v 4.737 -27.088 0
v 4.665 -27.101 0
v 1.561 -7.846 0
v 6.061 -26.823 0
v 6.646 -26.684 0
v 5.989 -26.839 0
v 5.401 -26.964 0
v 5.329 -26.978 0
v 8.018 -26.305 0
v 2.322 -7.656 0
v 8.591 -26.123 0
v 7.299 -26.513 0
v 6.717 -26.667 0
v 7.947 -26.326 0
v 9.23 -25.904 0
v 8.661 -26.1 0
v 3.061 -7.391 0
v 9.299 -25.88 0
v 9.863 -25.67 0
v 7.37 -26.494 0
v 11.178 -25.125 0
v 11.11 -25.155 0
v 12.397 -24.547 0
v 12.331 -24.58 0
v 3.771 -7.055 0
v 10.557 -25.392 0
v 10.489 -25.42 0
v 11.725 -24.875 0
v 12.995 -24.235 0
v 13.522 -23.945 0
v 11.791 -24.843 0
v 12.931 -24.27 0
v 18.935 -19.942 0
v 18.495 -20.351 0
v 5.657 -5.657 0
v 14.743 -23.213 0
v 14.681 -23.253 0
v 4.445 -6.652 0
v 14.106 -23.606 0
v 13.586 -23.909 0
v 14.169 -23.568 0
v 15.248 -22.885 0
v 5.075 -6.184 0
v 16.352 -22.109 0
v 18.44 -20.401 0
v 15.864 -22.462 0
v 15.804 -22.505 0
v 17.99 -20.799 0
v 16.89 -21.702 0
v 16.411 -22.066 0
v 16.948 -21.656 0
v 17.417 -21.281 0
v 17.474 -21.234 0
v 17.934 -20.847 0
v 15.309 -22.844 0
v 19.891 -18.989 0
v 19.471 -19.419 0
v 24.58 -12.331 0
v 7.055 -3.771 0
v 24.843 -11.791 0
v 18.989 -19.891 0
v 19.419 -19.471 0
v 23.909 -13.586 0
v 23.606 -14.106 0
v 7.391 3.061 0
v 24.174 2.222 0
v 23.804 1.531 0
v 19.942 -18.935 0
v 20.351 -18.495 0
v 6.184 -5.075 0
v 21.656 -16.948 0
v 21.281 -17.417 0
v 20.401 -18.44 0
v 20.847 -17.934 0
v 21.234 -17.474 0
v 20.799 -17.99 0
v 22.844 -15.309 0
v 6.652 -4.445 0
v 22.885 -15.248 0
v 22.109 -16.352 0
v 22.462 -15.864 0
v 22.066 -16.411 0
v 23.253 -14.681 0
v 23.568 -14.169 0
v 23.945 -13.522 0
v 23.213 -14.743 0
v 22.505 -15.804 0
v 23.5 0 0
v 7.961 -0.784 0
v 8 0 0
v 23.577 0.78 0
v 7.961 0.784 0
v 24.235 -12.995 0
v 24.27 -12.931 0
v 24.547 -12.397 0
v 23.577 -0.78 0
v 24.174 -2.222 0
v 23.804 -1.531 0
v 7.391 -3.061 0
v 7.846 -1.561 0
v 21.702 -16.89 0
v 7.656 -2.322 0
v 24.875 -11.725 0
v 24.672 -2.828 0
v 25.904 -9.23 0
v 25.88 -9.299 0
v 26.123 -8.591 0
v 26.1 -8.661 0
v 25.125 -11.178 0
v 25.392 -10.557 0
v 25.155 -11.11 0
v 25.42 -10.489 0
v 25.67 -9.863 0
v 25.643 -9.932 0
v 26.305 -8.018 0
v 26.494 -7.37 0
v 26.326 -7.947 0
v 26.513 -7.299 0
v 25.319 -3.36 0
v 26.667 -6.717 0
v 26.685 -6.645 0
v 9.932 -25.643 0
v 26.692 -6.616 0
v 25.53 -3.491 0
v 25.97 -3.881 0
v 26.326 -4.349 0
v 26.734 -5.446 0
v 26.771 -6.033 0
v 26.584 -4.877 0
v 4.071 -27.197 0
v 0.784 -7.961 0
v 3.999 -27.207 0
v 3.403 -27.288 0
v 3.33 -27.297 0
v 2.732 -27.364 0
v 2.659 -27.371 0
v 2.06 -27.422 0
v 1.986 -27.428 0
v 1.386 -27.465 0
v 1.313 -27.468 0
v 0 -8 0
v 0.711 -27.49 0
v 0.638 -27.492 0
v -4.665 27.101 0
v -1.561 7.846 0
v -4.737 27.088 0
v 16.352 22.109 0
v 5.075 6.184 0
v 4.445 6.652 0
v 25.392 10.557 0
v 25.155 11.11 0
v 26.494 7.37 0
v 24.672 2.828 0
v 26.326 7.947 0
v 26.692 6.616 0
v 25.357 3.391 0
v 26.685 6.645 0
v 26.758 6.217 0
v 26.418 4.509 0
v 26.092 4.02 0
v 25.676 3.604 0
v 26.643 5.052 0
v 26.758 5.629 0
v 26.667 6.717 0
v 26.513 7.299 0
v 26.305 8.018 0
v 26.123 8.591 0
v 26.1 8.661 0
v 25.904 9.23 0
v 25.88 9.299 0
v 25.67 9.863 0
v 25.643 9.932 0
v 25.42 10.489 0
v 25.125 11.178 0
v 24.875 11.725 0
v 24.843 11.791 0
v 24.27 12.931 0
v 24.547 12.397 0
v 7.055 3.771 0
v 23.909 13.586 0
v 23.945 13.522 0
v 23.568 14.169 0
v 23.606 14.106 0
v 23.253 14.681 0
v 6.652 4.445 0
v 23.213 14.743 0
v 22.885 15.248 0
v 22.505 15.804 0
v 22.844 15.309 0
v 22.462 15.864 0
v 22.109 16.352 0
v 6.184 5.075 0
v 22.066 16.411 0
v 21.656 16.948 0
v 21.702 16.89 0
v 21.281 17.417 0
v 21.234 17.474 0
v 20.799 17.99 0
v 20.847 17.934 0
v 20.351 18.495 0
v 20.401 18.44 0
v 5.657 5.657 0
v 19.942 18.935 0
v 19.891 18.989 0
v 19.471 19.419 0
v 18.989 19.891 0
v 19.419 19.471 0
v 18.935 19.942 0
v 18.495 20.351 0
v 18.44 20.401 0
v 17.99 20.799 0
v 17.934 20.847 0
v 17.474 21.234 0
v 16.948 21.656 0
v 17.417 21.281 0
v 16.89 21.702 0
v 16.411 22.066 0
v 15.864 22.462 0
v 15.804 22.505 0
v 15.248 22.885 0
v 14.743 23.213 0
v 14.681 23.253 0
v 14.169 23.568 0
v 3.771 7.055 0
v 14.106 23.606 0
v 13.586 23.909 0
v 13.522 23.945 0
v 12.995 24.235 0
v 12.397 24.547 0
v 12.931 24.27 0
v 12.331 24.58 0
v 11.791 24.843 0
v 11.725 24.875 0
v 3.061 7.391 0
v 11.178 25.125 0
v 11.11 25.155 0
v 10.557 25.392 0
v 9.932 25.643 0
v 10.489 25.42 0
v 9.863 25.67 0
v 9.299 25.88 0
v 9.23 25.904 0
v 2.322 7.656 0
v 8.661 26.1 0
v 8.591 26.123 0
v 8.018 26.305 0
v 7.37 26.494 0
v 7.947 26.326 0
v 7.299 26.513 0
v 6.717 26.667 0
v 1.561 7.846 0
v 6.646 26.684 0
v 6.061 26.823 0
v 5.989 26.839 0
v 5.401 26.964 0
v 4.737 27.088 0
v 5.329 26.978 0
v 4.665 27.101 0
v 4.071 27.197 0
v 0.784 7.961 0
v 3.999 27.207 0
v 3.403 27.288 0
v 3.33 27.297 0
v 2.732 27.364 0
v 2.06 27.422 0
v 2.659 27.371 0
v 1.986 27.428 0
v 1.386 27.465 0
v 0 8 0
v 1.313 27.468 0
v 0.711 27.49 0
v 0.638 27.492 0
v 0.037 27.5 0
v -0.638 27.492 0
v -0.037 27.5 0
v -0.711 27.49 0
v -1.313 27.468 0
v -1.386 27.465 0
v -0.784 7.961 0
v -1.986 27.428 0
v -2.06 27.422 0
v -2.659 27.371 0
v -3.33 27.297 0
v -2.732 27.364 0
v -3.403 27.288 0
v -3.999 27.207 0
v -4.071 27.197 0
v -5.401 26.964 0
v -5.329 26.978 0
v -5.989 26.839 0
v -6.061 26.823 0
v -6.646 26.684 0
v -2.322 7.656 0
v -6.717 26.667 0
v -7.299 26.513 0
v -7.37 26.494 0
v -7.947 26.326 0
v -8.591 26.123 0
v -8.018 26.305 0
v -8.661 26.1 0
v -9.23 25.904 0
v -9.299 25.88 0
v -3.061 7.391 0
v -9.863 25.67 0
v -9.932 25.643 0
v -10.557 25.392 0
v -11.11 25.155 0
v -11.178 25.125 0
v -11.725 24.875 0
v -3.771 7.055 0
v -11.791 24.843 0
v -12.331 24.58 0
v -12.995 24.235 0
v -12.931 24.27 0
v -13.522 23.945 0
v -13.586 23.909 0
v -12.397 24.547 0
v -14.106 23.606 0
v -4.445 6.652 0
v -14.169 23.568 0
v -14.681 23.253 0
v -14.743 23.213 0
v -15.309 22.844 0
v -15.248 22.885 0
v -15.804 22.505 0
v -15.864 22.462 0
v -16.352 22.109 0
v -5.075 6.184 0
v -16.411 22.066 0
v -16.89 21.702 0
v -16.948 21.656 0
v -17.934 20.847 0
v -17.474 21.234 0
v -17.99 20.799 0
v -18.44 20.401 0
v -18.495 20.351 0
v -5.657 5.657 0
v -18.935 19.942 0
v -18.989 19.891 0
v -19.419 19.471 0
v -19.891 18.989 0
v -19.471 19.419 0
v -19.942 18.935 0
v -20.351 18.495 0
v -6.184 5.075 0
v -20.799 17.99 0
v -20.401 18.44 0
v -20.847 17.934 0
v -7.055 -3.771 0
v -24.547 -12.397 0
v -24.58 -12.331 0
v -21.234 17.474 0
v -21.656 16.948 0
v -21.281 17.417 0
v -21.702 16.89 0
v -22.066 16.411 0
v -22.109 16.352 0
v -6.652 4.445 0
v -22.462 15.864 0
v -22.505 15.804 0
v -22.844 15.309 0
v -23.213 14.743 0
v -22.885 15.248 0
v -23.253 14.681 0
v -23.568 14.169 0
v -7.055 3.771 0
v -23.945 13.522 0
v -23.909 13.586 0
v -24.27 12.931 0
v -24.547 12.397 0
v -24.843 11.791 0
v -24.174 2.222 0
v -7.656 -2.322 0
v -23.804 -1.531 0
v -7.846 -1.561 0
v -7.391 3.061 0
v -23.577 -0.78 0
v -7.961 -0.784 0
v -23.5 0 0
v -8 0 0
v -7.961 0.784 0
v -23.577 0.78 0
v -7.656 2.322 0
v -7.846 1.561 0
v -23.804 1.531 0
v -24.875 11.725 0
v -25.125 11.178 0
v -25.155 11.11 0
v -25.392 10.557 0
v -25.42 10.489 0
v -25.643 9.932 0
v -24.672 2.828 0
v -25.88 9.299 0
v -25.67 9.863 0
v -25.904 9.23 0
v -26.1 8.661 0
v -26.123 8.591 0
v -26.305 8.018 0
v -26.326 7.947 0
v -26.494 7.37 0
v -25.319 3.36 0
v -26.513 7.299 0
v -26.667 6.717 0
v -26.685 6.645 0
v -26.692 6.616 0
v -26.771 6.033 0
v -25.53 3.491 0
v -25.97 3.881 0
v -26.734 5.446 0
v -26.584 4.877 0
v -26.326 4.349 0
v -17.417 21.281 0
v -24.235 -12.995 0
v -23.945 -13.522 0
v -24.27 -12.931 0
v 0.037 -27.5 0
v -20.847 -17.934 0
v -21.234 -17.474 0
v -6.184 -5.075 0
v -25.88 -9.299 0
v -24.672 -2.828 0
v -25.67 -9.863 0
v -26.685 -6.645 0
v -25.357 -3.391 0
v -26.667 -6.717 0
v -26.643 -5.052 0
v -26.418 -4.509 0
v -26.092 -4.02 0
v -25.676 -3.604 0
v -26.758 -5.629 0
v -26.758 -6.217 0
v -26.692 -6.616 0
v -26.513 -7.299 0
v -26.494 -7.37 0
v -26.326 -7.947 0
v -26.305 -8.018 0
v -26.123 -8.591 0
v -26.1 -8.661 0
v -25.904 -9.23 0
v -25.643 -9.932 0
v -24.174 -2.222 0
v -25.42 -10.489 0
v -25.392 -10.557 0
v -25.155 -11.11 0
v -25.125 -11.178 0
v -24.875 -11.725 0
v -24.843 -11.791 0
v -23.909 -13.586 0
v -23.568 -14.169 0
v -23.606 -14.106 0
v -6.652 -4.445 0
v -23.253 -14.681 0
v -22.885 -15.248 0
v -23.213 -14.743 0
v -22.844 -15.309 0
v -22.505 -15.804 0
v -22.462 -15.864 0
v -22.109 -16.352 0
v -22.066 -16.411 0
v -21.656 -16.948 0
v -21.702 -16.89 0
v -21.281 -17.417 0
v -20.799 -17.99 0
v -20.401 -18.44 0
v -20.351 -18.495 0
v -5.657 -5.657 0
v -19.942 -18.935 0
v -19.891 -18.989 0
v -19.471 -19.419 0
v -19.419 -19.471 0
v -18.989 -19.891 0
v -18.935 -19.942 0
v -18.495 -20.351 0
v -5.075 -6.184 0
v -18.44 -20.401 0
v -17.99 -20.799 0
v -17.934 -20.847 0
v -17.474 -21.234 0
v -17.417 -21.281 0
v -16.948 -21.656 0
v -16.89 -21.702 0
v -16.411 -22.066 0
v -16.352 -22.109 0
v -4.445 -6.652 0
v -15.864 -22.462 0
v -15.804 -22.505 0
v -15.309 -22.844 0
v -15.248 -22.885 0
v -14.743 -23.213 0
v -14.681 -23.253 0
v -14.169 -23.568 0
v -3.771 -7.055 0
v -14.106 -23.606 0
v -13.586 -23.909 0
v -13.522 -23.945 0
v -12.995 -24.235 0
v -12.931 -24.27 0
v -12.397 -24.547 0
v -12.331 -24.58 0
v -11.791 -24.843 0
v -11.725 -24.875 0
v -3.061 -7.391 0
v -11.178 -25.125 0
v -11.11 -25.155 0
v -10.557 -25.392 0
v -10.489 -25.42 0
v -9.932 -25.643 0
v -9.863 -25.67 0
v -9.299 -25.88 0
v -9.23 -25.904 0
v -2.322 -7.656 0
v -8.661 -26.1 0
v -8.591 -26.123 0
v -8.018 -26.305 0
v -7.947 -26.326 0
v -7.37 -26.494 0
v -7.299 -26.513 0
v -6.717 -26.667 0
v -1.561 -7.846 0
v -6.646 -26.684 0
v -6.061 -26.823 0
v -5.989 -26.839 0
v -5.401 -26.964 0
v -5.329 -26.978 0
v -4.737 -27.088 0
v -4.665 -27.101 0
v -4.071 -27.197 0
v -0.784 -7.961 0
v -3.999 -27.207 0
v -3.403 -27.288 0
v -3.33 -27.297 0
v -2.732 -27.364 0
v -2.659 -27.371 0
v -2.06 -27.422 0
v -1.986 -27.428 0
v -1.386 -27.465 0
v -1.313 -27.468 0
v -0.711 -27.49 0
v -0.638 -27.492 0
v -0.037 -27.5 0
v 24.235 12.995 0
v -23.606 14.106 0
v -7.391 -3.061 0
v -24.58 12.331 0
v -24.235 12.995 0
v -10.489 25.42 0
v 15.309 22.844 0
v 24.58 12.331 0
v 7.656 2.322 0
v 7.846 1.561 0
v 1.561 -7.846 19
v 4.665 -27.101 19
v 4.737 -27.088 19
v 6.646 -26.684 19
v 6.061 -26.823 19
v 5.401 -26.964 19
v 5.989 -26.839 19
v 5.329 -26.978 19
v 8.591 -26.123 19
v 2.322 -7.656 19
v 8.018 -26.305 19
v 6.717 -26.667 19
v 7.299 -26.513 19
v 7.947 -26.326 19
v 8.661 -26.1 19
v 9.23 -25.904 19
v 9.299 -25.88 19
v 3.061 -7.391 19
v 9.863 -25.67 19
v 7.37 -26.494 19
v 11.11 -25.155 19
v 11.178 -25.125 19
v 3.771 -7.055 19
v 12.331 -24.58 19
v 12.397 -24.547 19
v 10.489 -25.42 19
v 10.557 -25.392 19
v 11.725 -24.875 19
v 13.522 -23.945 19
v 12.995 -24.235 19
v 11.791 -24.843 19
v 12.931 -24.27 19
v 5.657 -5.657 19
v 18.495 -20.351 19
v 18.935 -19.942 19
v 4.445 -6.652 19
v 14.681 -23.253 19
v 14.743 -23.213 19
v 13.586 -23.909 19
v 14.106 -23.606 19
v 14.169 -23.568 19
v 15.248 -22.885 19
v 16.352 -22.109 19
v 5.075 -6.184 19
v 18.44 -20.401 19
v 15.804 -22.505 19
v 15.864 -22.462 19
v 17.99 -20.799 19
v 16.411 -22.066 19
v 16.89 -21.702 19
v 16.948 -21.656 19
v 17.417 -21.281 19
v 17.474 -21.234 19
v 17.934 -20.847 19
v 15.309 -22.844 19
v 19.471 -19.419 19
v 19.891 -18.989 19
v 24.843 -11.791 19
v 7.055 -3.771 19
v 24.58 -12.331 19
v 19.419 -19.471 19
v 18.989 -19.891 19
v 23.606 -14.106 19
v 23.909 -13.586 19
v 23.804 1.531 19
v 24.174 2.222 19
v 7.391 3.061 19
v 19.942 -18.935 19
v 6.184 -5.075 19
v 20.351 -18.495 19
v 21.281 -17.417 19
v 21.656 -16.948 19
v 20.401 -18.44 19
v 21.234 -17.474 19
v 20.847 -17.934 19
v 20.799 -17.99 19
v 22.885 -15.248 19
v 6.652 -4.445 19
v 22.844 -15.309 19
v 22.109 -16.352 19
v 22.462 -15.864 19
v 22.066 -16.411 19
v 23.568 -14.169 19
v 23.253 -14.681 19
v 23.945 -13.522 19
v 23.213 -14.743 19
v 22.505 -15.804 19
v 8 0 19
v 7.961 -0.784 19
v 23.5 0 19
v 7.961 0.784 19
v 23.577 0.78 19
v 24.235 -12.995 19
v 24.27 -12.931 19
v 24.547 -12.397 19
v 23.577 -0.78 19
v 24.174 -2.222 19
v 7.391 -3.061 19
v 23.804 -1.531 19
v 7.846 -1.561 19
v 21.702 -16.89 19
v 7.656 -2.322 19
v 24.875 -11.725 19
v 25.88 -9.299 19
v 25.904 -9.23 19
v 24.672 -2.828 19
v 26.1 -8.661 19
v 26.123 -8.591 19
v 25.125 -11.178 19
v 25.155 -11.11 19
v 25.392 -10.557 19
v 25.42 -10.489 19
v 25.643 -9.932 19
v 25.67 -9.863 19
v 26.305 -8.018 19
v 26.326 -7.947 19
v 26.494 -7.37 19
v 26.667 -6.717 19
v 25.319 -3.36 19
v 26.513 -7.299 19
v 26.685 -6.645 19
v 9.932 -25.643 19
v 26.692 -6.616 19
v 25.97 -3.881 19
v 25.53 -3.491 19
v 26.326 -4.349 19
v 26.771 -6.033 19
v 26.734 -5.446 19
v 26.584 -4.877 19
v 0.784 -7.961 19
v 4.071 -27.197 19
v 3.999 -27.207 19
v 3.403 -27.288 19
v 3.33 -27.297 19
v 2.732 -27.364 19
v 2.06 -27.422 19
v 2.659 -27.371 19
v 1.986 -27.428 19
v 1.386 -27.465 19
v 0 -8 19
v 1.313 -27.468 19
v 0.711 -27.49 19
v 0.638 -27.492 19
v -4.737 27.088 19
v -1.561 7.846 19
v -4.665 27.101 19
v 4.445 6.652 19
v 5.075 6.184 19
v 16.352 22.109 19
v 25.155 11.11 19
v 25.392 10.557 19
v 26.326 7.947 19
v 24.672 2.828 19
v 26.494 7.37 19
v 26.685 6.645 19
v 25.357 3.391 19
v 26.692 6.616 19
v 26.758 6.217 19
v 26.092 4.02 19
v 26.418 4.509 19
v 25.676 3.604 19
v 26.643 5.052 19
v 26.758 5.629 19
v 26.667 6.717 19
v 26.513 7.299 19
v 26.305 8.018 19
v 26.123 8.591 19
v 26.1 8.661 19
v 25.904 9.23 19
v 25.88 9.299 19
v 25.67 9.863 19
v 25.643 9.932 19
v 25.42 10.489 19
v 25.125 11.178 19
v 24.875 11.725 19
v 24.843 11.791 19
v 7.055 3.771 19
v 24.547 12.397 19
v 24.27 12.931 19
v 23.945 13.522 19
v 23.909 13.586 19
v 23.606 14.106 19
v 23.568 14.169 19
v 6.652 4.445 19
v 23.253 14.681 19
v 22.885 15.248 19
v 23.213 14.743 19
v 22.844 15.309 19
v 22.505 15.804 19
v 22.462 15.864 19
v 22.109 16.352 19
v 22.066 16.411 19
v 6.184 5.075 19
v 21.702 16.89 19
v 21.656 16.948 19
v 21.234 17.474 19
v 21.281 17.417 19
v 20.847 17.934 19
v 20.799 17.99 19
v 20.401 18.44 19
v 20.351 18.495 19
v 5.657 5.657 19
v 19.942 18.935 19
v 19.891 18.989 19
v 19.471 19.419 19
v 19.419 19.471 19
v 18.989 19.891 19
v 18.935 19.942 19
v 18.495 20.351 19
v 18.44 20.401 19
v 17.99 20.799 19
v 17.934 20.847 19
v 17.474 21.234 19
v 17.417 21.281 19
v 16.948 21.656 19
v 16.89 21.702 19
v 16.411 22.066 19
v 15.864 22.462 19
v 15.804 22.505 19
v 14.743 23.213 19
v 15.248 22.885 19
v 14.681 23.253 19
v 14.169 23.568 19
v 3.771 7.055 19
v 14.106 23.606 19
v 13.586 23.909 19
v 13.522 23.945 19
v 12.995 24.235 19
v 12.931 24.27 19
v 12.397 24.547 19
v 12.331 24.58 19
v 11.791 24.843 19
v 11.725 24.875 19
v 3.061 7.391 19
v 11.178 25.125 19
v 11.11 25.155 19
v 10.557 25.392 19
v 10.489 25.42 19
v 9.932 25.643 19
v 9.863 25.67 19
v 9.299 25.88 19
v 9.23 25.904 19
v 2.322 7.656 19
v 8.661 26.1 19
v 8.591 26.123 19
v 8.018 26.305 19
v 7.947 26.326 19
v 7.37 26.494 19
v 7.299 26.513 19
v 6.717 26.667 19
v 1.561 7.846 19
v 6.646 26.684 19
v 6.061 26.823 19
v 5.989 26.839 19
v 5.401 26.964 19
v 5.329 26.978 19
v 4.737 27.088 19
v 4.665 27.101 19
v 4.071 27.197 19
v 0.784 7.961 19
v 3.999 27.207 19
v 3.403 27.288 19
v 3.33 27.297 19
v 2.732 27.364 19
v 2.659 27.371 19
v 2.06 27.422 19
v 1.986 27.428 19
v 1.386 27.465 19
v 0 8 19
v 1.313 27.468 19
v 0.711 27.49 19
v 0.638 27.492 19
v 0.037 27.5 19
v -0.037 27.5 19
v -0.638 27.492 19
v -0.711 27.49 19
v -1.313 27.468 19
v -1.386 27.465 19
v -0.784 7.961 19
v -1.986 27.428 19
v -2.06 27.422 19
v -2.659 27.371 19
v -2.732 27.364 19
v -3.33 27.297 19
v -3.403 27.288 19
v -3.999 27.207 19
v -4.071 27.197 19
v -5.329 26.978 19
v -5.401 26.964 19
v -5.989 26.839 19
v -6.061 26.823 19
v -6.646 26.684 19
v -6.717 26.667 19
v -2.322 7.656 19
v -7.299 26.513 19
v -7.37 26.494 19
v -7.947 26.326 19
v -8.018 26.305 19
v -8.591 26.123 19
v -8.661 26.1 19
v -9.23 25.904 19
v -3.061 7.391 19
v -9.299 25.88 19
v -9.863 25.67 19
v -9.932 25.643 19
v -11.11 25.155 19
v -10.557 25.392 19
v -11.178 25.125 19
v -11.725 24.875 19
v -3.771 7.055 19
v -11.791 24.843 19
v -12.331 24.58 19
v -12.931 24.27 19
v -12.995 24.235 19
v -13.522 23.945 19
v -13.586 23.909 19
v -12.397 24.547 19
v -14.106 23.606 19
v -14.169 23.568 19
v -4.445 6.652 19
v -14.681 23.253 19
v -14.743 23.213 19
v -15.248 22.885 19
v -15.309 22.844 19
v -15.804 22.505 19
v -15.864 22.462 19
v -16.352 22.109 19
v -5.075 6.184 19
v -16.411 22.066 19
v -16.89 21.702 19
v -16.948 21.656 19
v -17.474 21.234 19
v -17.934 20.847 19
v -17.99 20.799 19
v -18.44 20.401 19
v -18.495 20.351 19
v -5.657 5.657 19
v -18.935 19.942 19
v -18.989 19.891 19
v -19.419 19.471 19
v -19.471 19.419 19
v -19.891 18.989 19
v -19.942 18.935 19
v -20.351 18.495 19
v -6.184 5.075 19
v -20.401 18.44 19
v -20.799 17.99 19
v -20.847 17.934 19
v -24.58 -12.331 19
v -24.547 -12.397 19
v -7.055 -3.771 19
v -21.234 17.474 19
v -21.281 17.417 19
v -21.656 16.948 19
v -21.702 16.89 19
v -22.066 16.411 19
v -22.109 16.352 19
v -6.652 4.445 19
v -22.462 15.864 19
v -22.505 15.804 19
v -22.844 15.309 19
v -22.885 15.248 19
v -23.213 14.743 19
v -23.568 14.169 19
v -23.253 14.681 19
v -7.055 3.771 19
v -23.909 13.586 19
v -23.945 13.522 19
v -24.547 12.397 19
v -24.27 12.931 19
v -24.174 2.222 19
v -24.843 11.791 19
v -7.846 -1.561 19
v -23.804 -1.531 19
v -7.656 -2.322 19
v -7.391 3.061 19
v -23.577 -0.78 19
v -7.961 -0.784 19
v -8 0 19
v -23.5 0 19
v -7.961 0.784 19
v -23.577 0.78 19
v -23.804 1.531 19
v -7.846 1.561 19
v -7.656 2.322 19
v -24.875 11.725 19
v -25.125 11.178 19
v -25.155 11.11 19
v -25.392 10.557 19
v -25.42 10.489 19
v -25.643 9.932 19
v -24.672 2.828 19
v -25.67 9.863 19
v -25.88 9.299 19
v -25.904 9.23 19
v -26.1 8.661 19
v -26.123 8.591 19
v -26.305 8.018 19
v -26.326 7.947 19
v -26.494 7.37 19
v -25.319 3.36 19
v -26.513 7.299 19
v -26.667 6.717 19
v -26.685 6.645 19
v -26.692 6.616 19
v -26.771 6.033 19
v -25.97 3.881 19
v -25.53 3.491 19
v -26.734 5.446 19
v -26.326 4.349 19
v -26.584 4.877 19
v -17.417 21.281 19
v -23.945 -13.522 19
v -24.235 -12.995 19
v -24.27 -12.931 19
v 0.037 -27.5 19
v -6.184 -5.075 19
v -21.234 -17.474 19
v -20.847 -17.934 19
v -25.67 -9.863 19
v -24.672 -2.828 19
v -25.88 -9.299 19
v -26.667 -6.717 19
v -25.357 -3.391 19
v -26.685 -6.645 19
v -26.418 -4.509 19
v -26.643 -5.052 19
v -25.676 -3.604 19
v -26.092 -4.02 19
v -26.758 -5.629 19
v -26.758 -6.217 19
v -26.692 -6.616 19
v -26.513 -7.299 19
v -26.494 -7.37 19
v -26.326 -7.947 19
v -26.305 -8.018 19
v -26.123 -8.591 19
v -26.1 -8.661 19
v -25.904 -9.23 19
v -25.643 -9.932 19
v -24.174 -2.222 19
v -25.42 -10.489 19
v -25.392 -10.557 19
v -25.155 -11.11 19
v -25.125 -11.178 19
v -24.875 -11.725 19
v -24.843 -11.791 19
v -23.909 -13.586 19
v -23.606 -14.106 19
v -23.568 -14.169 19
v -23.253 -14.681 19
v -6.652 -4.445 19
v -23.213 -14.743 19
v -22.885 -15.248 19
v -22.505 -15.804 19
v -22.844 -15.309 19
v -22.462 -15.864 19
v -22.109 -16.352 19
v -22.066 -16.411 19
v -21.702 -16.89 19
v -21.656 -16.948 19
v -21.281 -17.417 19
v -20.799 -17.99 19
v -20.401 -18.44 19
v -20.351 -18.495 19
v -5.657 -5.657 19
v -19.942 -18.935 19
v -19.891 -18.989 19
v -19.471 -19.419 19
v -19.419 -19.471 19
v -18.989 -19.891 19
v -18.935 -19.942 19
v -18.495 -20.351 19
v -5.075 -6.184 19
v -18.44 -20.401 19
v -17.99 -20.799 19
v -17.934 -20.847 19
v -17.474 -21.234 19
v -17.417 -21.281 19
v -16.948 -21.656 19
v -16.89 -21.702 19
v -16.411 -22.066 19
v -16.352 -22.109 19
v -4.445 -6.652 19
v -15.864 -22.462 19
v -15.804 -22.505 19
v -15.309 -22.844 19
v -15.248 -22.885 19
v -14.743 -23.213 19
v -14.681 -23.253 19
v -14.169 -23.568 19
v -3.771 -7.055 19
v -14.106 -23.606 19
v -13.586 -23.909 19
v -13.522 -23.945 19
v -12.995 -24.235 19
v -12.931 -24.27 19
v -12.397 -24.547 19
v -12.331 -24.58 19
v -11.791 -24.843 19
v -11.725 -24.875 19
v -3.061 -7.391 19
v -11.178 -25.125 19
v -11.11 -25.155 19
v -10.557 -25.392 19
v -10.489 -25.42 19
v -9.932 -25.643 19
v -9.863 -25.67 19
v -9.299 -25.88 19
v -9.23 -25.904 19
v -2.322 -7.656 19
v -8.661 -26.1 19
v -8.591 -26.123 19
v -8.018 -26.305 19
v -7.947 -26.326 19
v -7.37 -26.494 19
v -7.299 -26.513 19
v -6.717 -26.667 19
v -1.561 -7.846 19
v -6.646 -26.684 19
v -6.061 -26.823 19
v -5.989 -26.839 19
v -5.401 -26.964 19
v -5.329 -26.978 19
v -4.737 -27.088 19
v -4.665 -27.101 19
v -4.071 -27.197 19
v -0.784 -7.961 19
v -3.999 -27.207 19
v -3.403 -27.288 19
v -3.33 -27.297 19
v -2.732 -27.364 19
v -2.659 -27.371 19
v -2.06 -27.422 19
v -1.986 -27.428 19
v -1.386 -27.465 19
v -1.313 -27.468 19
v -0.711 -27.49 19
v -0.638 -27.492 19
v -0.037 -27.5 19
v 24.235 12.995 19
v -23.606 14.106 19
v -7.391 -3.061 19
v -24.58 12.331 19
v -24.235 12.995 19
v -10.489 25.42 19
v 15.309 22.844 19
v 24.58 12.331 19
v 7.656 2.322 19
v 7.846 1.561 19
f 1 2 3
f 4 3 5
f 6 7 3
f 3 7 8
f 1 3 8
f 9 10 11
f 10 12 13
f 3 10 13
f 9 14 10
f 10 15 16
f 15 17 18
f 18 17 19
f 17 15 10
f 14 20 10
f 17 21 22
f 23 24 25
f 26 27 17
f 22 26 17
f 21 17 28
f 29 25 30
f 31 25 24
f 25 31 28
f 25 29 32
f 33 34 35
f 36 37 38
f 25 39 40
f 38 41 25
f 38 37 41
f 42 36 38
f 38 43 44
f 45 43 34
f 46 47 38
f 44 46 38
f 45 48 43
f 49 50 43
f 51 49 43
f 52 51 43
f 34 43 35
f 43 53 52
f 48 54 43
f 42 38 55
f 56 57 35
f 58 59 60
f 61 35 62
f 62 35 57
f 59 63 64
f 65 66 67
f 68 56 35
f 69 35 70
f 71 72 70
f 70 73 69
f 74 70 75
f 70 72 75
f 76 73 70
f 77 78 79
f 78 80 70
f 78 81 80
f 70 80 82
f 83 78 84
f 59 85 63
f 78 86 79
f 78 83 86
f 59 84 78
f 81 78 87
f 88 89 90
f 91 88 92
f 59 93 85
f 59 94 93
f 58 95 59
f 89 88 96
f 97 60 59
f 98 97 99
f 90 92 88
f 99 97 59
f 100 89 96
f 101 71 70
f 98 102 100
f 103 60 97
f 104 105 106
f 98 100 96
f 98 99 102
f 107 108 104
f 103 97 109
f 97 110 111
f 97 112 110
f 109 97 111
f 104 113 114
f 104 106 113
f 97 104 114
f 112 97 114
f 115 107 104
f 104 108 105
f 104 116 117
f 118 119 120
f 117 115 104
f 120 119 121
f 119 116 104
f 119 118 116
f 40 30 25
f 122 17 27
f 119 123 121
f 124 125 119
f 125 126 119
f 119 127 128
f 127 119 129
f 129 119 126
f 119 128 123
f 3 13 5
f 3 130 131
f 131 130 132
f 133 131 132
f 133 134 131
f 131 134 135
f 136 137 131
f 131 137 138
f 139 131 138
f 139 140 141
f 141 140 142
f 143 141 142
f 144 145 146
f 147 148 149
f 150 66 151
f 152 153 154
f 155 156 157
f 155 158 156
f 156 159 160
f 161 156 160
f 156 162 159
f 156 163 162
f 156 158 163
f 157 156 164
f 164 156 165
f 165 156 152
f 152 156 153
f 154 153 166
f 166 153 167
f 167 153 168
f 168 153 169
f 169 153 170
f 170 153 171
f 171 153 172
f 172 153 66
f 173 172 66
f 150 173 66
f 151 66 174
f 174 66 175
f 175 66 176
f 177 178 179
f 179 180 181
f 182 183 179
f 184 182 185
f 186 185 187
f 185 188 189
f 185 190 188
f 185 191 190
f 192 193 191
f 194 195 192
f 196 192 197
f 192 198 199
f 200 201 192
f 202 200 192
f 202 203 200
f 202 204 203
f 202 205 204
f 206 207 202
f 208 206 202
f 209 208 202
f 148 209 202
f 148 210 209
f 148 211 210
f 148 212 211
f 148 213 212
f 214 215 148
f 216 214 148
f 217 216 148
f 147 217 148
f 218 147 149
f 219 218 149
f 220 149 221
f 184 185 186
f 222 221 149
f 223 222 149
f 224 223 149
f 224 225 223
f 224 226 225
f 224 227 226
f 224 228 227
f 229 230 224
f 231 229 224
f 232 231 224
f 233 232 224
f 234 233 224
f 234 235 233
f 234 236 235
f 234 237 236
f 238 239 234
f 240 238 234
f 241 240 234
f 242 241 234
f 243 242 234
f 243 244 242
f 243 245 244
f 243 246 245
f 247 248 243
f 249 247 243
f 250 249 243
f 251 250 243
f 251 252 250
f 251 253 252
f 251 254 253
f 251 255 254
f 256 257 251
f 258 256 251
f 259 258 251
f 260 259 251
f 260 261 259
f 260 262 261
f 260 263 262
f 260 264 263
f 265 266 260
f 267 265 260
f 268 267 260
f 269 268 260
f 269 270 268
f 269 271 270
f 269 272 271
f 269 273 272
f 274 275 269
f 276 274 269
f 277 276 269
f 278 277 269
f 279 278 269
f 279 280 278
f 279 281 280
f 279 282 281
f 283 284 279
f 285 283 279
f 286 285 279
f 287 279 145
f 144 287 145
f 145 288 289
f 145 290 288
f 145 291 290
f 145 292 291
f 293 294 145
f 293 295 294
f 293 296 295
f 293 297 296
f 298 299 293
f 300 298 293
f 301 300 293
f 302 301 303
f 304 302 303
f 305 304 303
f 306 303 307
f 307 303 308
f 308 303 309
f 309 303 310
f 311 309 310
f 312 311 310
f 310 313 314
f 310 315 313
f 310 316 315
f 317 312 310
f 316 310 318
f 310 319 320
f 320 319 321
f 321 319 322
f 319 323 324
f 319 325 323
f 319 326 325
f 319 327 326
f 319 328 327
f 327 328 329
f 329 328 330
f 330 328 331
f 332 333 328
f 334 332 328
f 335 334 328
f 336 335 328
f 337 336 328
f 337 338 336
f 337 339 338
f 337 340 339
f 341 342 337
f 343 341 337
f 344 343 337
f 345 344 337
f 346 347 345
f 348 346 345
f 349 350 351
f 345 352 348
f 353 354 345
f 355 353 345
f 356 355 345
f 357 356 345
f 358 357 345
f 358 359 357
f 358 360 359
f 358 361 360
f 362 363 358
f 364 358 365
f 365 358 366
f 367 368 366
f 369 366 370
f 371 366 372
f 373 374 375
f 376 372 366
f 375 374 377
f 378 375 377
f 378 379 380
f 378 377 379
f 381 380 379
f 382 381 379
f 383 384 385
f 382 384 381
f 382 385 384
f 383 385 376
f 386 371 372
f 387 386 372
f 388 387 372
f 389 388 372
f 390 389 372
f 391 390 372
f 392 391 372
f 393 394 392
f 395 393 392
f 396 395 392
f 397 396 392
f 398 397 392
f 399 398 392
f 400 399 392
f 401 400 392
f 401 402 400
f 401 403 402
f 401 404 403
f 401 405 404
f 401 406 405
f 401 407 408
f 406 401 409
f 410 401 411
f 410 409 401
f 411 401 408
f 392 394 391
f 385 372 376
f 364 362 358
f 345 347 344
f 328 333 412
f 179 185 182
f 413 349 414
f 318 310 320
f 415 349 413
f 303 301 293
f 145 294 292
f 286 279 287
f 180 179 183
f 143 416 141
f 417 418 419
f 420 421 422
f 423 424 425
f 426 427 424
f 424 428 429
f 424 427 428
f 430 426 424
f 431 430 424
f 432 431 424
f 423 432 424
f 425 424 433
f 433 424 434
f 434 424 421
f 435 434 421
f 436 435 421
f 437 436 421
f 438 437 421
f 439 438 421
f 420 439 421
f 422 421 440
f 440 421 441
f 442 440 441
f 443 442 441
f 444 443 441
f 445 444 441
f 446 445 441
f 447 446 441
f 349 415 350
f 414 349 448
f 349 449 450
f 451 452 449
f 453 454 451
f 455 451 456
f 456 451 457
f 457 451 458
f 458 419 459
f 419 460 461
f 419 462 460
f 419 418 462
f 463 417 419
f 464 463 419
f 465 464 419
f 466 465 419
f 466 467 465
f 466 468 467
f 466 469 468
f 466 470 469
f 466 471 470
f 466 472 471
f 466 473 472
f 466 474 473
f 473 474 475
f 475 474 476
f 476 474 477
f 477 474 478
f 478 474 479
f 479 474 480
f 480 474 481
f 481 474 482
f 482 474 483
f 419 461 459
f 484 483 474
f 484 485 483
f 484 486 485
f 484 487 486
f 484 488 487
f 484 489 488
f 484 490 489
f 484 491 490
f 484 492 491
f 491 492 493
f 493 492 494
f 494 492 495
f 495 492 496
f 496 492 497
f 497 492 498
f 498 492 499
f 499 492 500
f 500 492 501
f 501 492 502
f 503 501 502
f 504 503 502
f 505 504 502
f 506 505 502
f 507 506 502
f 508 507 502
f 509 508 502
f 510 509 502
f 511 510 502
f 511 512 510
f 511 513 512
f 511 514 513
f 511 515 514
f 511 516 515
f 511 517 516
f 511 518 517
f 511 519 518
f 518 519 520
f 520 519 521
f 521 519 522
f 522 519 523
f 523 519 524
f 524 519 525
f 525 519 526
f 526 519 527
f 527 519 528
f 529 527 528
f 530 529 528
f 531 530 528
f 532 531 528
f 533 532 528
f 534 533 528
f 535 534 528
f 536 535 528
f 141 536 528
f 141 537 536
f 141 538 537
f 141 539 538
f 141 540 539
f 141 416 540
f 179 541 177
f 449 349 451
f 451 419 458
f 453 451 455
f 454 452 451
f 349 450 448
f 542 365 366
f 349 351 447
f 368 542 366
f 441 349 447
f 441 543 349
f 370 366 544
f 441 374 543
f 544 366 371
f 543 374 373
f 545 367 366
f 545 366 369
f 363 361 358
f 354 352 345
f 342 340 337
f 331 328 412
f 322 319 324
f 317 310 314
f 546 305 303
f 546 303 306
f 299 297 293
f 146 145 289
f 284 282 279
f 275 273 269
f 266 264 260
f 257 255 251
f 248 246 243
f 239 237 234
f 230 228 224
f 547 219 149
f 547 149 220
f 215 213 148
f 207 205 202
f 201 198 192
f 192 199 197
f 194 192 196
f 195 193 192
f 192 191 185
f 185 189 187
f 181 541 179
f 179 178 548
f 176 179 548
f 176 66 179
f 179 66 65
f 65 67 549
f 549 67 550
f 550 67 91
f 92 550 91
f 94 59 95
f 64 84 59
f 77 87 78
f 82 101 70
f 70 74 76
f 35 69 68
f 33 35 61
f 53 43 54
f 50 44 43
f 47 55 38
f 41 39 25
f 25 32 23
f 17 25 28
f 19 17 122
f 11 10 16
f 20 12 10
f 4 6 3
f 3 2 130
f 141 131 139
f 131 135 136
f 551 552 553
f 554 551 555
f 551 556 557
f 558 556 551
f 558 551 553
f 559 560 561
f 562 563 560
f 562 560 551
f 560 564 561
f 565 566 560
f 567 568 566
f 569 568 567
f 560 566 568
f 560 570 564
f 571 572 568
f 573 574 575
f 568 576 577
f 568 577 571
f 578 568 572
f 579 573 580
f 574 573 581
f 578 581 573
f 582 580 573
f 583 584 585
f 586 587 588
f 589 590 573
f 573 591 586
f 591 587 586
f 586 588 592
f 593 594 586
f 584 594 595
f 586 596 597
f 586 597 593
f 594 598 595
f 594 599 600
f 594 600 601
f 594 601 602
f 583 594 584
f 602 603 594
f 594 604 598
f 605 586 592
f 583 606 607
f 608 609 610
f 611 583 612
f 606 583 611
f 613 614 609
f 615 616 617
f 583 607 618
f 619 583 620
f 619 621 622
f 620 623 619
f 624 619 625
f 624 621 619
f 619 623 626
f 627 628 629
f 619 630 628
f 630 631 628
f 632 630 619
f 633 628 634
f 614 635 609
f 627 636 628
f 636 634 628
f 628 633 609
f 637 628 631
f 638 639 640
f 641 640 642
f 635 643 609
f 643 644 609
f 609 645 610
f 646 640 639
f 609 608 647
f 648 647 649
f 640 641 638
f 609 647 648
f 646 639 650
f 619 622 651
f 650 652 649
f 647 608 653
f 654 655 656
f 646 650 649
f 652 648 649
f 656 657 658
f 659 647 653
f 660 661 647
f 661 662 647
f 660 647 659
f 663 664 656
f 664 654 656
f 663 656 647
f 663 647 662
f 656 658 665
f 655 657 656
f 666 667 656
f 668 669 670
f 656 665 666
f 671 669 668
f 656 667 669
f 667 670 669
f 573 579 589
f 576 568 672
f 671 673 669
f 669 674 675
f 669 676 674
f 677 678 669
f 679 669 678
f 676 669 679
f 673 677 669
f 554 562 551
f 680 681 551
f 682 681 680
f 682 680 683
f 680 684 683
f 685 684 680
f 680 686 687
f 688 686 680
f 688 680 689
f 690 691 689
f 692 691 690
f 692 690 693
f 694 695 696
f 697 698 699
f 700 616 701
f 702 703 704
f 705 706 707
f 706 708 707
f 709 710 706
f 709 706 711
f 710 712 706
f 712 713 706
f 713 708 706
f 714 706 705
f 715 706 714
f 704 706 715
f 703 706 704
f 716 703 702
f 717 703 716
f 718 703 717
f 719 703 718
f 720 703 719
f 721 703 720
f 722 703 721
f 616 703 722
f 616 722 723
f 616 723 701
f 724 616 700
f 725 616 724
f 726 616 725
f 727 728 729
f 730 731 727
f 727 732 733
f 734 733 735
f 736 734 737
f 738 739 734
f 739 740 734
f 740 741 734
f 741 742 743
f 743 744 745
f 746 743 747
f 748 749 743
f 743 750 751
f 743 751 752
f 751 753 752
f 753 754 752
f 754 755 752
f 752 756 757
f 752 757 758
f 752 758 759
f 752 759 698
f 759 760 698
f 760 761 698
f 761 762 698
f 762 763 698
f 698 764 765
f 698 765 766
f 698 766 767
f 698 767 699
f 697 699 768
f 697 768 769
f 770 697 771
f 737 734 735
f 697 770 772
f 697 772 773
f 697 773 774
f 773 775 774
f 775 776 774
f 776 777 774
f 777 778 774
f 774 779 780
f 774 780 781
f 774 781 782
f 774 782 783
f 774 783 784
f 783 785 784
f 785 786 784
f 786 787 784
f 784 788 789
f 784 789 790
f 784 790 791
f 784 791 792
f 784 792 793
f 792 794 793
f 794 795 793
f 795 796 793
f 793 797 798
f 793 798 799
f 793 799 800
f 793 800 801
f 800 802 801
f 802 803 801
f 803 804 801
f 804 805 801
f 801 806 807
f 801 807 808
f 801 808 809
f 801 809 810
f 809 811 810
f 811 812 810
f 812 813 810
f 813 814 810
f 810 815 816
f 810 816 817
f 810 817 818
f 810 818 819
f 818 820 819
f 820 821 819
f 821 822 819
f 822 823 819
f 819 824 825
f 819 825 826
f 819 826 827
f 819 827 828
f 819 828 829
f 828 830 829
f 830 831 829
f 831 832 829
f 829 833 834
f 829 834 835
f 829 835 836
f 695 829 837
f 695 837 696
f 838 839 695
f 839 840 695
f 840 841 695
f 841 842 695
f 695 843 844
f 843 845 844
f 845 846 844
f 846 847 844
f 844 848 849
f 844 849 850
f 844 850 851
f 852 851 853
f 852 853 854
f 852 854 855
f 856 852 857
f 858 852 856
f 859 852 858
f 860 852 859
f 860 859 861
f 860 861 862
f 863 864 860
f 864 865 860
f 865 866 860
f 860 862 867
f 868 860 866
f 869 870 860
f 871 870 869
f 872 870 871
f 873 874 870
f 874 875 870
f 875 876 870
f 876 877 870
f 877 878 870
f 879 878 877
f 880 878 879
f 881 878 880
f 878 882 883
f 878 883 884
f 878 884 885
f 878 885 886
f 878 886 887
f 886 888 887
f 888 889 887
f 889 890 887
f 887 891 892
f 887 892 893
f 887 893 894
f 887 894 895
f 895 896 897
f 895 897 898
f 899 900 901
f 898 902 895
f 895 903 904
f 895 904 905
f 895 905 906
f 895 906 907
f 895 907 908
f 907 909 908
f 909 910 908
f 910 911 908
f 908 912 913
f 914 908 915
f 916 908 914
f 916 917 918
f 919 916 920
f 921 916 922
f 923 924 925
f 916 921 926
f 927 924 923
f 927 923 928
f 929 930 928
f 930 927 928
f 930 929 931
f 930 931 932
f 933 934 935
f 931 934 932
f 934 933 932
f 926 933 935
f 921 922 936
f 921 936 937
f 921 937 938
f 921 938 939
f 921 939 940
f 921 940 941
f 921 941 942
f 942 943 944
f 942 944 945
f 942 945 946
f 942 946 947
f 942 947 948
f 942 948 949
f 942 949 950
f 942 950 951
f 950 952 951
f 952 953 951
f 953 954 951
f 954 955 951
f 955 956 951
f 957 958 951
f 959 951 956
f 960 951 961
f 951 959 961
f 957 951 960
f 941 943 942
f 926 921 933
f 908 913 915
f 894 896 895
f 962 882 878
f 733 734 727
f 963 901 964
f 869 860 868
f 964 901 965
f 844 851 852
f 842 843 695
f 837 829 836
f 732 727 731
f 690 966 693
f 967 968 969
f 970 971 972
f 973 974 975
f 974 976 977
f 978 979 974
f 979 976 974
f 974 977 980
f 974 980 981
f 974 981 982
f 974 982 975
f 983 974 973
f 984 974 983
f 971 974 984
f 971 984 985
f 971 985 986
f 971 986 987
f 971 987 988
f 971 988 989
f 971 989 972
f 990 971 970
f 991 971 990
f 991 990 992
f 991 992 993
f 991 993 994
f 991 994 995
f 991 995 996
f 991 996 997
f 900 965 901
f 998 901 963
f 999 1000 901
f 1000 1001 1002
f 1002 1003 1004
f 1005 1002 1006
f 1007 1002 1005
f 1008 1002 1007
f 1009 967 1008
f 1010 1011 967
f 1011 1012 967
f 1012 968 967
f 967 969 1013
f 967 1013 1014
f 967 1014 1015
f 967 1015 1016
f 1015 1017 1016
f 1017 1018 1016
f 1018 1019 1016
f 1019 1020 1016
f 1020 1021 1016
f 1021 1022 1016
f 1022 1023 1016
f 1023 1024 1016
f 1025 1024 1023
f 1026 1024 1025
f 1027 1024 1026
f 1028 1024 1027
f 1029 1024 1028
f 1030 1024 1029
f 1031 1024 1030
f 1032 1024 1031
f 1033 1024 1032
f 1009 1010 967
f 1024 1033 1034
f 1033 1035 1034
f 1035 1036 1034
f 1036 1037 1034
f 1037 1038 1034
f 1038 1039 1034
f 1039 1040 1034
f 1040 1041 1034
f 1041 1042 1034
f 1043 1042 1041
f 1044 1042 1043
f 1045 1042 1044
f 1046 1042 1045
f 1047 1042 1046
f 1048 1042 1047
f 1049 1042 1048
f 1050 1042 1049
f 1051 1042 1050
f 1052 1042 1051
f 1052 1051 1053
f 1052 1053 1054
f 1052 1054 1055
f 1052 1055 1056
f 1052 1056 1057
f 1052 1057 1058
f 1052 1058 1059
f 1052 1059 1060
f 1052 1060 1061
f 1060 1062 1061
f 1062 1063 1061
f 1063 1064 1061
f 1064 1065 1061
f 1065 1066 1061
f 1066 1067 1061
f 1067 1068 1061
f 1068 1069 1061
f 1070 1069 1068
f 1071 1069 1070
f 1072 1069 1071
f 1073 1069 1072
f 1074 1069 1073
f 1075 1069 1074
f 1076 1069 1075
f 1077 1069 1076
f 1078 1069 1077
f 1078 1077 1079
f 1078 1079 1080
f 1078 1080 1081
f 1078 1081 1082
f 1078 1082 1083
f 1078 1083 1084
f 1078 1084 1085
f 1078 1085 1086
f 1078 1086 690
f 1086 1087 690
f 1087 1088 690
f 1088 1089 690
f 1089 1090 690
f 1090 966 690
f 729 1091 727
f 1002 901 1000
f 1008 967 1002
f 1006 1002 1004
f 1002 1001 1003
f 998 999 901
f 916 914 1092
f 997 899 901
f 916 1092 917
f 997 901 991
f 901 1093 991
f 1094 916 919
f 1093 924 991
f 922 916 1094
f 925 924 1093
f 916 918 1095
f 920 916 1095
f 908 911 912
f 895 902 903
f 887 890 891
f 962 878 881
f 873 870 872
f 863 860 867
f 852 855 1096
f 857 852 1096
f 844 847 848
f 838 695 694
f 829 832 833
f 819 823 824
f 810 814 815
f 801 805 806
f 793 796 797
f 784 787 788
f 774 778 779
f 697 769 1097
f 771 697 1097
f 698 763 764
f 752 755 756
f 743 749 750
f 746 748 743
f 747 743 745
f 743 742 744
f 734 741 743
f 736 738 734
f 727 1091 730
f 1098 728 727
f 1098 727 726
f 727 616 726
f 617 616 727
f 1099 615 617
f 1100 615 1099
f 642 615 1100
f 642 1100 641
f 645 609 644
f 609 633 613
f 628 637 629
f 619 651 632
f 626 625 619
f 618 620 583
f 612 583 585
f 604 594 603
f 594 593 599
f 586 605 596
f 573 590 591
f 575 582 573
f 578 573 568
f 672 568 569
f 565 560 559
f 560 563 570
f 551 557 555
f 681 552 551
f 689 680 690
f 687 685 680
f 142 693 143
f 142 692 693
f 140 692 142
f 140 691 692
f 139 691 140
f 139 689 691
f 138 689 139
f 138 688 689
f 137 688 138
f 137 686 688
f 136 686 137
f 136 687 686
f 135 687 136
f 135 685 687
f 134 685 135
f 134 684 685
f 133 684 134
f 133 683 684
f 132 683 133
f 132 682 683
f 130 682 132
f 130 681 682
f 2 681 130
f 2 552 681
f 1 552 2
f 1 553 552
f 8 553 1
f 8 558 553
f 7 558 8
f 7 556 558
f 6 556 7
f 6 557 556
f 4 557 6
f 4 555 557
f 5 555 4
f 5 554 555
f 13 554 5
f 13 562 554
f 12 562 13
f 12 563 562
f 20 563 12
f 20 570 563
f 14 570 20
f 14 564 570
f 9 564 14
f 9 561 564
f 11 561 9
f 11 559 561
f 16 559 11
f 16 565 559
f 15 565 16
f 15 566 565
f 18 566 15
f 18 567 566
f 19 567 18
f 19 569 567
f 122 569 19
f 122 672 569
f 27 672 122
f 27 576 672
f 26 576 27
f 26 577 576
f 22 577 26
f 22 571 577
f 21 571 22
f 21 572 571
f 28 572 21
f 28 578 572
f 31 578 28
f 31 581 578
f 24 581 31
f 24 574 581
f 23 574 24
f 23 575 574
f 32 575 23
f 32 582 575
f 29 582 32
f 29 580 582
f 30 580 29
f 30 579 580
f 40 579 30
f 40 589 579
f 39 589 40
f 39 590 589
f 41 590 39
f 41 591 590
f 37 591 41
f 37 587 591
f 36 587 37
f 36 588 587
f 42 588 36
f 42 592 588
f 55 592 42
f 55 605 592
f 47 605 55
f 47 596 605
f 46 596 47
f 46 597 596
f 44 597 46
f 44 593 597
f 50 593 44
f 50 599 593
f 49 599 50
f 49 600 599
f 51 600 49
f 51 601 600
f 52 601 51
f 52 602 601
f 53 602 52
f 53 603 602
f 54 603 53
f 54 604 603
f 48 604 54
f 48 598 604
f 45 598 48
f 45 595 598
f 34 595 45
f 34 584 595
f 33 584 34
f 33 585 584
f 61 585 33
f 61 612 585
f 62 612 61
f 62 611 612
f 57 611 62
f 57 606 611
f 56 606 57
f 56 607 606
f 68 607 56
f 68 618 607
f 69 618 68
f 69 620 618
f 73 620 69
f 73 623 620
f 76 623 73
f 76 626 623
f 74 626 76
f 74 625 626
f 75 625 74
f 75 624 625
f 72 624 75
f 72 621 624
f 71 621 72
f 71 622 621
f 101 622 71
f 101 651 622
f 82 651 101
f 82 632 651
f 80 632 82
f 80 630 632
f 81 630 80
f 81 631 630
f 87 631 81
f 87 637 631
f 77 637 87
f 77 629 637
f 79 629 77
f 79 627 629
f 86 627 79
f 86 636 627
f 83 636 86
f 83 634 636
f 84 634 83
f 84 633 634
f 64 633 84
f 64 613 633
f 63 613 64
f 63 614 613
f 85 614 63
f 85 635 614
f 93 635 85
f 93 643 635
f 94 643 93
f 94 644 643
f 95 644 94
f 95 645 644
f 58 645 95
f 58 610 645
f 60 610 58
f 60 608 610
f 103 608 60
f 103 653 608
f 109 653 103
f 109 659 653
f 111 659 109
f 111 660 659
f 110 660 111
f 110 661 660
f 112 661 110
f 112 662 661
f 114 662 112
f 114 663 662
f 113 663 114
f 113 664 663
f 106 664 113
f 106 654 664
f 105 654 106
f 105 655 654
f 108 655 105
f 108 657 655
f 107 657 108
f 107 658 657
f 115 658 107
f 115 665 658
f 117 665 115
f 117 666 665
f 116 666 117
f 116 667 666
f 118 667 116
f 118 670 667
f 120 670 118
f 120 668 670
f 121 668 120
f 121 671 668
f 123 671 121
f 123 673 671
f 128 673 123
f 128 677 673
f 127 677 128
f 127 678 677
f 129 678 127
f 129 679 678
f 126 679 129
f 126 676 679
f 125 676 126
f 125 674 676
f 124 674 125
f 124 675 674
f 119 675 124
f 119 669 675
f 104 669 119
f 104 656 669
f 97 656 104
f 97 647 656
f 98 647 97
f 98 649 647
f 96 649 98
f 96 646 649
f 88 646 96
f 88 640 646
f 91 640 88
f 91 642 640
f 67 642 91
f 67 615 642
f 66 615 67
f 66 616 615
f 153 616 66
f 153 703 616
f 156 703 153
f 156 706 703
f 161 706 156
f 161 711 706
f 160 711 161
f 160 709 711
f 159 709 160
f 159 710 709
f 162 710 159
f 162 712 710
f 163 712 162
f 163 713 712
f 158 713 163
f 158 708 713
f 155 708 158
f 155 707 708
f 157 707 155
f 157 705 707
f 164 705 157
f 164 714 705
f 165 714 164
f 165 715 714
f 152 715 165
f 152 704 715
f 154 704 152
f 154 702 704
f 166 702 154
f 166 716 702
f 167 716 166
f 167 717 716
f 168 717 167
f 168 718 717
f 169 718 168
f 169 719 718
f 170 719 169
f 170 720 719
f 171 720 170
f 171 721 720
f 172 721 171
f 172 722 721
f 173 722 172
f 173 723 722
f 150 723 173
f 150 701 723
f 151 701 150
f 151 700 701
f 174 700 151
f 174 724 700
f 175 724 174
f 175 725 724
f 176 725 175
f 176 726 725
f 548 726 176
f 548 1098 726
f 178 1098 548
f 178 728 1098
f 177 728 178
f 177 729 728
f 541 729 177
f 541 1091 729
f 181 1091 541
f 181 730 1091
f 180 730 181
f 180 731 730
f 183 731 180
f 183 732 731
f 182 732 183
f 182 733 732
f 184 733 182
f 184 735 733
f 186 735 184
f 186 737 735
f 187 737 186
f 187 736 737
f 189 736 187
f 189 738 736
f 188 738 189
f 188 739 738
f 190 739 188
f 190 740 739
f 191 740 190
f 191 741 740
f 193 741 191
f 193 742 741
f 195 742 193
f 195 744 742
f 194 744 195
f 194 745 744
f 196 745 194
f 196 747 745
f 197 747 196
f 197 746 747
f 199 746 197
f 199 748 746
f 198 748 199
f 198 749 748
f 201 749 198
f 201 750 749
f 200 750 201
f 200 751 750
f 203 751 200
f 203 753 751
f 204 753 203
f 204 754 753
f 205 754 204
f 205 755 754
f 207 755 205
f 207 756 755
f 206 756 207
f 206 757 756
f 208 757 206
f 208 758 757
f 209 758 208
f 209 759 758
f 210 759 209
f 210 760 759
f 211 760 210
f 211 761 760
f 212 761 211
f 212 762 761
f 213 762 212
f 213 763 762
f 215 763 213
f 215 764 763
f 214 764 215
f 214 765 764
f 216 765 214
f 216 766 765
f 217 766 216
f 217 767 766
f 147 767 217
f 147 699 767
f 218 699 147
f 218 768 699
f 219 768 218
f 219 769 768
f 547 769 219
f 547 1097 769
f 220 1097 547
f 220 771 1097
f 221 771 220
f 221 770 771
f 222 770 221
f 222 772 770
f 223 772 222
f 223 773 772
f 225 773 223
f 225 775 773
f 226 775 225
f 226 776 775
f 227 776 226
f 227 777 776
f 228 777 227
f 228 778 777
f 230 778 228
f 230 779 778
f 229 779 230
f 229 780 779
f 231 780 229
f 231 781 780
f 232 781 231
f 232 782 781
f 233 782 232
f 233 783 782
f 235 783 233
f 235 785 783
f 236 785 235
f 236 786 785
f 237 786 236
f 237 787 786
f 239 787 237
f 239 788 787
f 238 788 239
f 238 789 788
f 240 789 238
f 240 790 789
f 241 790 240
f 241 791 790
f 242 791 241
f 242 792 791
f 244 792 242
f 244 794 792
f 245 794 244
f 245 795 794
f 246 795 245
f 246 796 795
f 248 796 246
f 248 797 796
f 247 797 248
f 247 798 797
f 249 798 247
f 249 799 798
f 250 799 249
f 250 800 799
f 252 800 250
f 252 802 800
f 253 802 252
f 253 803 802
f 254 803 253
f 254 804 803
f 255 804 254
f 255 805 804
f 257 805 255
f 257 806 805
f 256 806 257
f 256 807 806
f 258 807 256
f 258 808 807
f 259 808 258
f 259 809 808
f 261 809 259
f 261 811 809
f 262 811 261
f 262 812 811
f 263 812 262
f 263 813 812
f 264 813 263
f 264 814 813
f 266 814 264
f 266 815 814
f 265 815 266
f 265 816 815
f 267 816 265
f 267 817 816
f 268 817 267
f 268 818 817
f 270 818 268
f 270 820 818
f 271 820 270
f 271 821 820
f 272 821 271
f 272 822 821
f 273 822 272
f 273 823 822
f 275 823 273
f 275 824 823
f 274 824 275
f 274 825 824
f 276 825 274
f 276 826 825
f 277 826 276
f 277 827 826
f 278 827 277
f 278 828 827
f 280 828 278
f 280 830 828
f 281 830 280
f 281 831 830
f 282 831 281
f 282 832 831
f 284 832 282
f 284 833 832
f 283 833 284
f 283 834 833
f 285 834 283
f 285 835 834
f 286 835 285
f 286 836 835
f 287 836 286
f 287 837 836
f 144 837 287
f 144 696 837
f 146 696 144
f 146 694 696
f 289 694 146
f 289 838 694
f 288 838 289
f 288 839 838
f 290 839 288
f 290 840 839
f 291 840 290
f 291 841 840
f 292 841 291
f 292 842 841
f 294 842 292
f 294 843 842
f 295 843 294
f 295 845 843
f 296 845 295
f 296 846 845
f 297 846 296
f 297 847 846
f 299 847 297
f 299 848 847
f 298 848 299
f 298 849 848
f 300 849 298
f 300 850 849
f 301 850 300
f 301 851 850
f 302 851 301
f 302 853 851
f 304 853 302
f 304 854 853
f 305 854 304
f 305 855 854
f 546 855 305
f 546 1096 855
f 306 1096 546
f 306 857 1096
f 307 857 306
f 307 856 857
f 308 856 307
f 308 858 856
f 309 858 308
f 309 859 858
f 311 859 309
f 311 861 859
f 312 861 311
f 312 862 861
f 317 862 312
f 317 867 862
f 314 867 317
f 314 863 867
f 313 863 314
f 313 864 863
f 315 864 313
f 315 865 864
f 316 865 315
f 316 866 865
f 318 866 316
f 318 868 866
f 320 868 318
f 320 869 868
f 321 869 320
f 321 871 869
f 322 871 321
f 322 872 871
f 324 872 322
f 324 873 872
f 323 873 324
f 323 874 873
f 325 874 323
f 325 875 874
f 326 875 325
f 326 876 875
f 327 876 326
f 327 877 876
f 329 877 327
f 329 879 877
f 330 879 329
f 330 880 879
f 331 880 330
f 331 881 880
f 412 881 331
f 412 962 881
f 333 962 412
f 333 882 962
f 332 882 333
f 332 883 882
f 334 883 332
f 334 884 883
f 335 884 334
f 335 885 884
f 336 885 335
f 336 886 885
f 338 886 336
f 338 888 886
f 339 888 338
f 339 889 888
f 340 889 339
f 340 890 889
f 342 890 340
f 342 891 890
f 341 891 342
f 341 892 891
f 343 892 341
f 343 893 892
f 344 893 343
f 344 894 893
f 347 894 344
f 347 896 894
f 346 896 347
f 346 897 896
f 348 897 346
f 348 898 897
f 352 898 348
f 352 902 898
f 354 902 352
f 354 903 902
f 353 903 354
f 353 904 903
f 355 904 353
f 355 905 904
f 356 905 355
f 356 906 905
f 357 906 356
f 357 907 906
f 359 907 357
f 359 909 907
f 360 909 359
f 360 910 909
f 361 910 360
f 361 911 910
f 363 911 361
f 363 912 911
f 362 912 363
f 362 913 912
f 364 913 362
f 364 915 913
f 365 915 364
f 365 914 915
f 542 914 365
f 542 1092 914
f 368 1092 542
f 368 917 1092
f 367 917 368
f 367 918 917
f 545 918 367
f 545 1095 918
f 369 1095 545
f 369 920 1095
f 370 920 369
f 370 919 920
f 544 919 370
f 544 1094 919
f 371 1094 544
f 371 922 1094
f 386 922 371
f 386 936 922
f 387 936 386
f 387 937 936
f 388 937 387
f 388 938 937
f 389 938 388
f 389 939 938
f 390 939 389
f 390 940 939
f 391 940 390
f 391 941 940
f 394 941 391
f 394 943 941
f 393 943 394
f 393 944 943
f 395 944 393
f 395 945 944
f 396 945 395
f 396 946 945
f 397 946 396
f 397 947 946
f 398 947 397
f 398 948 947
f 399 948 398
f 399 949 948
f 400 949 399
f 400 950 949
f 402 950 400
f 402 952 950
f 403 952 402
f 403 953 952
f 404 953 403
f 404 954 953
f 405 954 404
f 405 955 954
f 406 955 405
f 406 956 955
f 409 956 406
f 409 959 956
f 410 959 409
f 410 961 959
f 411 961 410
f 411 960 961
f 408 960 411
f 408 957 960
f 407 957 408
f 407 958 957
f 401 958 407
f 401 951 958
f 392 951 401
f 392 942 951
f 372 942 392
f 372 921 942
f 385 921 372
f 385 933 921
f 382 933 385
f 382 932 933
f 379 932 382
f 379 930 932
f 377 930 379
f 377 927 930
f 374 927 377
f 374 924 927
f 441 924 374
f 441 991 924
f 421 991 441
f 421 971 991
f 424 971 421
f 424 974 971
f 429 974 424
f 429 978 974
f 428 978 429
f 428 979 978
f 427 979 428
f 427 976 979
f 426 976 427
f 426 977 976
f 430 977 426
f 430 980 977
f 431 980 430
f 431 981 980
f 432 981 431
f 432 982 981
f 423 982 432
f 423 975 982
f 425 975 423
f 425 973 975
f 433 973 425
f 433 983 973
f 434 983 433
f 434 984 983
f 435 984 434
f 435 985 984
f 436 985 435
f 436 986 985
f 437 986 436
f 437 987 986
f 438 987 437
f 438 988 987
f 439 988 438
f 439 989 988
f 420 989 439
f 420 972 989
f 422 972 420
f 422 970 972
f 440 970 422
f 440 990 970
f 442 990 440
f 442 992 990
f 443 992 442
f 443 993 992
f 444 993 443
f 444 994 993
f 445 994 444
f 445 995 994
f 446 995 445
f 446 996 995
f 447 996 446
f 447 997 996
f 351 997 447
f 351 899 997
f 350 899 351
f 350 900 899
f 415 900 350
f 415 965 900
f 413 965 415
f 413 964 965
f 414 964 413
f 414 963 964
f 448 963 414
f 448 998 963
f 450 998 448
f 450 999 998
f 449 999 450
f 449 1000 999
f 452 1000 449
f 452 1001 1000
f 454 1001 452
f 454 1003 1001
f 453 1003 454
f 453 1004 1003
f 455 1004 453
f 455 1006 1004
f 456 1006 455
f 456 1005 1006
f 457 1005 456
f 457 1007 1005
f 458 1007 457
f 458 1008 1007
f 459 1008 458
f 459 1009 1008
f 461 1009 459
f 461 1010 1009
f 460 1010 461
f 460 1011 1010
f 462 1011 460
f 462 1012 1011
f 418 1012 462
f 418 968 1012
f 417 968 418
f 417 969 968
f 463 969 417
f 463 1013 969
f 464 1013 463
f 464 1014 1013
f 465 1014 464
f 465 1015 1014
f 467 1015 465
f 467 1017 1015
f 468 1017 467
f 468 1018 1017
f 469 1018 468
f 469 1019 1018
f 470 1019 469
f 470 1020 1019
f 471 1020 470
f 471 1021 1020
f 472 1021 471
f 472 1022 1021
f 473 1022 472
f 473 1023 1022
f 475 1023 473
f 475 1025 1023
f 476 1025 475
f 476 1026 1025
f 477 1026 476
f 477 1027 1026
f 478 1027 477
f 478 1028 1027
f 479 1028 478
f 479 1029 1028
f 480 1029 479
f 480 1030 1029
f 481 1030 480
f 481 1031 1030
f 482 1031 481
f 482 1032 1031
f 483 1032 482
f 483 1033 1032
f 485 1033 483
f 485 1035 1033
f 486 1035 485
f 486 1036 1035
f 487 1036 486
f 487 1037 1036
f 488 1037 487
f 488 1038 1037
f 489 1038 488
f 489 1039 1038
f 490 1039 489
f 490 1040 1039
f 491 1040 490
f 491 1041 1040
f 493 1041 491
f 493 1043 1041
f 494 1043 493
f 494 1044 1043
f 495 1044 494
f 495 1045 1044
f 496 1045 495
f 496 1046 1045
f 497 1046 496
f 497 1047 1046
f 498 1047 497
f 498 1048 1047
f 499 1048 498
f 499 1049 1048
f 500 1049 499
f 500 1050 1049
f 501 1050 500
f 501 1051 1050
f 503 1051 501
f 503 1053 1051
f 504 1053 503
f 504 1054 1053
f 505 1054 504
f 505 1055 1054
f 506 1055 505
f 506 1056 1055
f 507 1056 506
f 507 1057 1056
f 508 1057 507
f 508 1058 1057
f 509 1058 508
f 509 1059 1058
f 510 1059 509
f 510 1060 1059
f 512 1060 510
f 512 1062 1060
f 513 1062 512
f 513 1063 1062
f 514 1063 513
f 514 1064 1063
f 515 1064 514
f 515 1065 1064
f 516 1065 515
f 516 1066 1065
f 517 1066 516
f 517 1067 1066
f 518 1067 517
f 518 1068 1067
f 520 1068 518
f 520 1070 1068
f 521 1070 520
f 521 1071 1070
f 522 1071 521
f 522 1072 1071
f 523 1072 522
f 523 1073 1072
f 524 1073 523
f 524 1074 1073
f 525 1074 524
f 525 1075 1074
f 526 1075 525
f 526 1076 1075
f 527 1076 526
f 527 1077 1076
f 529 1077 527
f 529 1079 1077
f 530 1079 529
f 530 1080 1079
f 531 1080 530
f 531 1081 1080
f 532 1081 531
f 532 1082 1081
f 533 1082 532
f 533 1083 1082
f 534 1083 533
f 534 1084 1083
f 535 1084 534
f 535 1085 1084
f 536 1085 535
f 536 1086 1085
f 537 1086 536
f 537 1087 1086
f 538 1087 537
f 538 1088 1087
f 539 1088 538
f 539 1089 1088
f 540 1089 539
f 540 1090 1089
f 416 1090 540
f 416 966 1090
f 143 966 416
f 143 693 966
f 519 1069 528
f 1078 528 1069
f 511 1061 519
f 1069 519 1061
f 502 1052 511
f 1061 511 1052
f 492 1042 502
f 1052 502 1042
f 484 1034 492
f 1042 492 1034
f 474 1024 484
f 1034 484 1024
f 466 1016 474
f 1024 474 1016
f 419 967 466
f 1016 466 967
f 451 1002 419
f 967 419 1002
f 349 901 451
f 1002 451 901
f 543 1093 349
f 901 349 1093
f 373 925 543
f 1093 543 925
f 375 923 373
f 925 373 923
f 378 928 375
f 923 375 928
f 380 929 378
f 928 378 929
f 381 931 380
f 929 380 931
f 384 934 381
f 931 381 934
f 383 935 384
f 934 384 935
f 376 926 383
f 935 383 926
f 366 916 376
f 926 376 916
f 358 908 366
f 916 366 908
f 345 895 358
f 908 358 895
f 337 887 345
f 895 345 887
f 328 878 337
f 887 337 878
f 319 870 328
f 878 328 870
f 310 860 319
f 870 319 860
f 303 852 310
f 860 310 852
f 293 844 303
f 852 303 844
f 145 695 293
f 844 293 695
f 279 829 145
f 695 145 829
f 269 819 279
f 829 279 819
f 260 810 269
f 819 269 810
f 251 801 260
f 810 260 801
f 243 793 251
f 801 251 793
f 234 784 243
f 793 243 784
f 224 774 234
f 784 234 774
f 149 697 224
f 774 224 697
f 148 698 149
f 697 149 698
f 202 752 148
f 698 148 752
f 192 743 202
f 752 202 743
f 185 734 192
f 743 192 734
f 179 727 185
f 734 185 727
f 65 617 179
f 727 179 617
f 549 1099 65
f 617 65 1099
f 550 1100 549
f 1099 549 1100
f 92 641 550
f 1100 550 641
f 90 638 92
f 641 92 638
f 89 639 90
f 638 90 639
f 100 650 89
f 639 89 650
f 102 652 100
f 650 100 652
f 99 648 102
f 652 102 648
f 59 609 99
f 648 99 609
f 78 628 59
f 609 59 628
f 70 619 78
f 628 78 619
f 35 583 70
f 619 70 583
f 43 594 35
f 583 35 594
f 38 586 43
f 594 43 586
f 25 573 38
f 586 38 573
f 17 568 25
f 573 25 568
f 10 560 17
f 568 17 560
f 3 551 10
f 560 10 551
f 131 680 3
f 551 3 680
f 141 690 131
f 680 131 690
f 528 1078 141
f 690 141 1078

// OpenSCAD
// file: knob_lib.scad
gMaterialThick = 19;
gCutDepth = -(gMaterialThick+0.4);
gBitSize = 4;

gHoleDia = 16;
gKnobDia = 55;
gNumDetents = 2;
gDetentDia = 8;
gDetentInset = 0;
gRoundoverRad = 3;

module Outline() {
  offset(r=gRoundoverRad,$fn=32) offset(delta=-gRoundoverRad)
  difference() {
    circle(d=gKnobDia, $fn=256);
    for(i=[0:gNumDetents-1]) rotate([0,0,360/gNumDetents*i])
      hull() for(x=[0,20]) translate([gKnobDia/2-gDetentInset+x,0])
      circle(d=gDetentDia,$fn=32);
  }
}

module Hole() {
  circle(d=gHoleDia,$fn=64);
}
// main file
include <knob_lib.scad>;

linear_extrude(height=gMaterialThick) difference() {
  Outline();
  Hole();
}
